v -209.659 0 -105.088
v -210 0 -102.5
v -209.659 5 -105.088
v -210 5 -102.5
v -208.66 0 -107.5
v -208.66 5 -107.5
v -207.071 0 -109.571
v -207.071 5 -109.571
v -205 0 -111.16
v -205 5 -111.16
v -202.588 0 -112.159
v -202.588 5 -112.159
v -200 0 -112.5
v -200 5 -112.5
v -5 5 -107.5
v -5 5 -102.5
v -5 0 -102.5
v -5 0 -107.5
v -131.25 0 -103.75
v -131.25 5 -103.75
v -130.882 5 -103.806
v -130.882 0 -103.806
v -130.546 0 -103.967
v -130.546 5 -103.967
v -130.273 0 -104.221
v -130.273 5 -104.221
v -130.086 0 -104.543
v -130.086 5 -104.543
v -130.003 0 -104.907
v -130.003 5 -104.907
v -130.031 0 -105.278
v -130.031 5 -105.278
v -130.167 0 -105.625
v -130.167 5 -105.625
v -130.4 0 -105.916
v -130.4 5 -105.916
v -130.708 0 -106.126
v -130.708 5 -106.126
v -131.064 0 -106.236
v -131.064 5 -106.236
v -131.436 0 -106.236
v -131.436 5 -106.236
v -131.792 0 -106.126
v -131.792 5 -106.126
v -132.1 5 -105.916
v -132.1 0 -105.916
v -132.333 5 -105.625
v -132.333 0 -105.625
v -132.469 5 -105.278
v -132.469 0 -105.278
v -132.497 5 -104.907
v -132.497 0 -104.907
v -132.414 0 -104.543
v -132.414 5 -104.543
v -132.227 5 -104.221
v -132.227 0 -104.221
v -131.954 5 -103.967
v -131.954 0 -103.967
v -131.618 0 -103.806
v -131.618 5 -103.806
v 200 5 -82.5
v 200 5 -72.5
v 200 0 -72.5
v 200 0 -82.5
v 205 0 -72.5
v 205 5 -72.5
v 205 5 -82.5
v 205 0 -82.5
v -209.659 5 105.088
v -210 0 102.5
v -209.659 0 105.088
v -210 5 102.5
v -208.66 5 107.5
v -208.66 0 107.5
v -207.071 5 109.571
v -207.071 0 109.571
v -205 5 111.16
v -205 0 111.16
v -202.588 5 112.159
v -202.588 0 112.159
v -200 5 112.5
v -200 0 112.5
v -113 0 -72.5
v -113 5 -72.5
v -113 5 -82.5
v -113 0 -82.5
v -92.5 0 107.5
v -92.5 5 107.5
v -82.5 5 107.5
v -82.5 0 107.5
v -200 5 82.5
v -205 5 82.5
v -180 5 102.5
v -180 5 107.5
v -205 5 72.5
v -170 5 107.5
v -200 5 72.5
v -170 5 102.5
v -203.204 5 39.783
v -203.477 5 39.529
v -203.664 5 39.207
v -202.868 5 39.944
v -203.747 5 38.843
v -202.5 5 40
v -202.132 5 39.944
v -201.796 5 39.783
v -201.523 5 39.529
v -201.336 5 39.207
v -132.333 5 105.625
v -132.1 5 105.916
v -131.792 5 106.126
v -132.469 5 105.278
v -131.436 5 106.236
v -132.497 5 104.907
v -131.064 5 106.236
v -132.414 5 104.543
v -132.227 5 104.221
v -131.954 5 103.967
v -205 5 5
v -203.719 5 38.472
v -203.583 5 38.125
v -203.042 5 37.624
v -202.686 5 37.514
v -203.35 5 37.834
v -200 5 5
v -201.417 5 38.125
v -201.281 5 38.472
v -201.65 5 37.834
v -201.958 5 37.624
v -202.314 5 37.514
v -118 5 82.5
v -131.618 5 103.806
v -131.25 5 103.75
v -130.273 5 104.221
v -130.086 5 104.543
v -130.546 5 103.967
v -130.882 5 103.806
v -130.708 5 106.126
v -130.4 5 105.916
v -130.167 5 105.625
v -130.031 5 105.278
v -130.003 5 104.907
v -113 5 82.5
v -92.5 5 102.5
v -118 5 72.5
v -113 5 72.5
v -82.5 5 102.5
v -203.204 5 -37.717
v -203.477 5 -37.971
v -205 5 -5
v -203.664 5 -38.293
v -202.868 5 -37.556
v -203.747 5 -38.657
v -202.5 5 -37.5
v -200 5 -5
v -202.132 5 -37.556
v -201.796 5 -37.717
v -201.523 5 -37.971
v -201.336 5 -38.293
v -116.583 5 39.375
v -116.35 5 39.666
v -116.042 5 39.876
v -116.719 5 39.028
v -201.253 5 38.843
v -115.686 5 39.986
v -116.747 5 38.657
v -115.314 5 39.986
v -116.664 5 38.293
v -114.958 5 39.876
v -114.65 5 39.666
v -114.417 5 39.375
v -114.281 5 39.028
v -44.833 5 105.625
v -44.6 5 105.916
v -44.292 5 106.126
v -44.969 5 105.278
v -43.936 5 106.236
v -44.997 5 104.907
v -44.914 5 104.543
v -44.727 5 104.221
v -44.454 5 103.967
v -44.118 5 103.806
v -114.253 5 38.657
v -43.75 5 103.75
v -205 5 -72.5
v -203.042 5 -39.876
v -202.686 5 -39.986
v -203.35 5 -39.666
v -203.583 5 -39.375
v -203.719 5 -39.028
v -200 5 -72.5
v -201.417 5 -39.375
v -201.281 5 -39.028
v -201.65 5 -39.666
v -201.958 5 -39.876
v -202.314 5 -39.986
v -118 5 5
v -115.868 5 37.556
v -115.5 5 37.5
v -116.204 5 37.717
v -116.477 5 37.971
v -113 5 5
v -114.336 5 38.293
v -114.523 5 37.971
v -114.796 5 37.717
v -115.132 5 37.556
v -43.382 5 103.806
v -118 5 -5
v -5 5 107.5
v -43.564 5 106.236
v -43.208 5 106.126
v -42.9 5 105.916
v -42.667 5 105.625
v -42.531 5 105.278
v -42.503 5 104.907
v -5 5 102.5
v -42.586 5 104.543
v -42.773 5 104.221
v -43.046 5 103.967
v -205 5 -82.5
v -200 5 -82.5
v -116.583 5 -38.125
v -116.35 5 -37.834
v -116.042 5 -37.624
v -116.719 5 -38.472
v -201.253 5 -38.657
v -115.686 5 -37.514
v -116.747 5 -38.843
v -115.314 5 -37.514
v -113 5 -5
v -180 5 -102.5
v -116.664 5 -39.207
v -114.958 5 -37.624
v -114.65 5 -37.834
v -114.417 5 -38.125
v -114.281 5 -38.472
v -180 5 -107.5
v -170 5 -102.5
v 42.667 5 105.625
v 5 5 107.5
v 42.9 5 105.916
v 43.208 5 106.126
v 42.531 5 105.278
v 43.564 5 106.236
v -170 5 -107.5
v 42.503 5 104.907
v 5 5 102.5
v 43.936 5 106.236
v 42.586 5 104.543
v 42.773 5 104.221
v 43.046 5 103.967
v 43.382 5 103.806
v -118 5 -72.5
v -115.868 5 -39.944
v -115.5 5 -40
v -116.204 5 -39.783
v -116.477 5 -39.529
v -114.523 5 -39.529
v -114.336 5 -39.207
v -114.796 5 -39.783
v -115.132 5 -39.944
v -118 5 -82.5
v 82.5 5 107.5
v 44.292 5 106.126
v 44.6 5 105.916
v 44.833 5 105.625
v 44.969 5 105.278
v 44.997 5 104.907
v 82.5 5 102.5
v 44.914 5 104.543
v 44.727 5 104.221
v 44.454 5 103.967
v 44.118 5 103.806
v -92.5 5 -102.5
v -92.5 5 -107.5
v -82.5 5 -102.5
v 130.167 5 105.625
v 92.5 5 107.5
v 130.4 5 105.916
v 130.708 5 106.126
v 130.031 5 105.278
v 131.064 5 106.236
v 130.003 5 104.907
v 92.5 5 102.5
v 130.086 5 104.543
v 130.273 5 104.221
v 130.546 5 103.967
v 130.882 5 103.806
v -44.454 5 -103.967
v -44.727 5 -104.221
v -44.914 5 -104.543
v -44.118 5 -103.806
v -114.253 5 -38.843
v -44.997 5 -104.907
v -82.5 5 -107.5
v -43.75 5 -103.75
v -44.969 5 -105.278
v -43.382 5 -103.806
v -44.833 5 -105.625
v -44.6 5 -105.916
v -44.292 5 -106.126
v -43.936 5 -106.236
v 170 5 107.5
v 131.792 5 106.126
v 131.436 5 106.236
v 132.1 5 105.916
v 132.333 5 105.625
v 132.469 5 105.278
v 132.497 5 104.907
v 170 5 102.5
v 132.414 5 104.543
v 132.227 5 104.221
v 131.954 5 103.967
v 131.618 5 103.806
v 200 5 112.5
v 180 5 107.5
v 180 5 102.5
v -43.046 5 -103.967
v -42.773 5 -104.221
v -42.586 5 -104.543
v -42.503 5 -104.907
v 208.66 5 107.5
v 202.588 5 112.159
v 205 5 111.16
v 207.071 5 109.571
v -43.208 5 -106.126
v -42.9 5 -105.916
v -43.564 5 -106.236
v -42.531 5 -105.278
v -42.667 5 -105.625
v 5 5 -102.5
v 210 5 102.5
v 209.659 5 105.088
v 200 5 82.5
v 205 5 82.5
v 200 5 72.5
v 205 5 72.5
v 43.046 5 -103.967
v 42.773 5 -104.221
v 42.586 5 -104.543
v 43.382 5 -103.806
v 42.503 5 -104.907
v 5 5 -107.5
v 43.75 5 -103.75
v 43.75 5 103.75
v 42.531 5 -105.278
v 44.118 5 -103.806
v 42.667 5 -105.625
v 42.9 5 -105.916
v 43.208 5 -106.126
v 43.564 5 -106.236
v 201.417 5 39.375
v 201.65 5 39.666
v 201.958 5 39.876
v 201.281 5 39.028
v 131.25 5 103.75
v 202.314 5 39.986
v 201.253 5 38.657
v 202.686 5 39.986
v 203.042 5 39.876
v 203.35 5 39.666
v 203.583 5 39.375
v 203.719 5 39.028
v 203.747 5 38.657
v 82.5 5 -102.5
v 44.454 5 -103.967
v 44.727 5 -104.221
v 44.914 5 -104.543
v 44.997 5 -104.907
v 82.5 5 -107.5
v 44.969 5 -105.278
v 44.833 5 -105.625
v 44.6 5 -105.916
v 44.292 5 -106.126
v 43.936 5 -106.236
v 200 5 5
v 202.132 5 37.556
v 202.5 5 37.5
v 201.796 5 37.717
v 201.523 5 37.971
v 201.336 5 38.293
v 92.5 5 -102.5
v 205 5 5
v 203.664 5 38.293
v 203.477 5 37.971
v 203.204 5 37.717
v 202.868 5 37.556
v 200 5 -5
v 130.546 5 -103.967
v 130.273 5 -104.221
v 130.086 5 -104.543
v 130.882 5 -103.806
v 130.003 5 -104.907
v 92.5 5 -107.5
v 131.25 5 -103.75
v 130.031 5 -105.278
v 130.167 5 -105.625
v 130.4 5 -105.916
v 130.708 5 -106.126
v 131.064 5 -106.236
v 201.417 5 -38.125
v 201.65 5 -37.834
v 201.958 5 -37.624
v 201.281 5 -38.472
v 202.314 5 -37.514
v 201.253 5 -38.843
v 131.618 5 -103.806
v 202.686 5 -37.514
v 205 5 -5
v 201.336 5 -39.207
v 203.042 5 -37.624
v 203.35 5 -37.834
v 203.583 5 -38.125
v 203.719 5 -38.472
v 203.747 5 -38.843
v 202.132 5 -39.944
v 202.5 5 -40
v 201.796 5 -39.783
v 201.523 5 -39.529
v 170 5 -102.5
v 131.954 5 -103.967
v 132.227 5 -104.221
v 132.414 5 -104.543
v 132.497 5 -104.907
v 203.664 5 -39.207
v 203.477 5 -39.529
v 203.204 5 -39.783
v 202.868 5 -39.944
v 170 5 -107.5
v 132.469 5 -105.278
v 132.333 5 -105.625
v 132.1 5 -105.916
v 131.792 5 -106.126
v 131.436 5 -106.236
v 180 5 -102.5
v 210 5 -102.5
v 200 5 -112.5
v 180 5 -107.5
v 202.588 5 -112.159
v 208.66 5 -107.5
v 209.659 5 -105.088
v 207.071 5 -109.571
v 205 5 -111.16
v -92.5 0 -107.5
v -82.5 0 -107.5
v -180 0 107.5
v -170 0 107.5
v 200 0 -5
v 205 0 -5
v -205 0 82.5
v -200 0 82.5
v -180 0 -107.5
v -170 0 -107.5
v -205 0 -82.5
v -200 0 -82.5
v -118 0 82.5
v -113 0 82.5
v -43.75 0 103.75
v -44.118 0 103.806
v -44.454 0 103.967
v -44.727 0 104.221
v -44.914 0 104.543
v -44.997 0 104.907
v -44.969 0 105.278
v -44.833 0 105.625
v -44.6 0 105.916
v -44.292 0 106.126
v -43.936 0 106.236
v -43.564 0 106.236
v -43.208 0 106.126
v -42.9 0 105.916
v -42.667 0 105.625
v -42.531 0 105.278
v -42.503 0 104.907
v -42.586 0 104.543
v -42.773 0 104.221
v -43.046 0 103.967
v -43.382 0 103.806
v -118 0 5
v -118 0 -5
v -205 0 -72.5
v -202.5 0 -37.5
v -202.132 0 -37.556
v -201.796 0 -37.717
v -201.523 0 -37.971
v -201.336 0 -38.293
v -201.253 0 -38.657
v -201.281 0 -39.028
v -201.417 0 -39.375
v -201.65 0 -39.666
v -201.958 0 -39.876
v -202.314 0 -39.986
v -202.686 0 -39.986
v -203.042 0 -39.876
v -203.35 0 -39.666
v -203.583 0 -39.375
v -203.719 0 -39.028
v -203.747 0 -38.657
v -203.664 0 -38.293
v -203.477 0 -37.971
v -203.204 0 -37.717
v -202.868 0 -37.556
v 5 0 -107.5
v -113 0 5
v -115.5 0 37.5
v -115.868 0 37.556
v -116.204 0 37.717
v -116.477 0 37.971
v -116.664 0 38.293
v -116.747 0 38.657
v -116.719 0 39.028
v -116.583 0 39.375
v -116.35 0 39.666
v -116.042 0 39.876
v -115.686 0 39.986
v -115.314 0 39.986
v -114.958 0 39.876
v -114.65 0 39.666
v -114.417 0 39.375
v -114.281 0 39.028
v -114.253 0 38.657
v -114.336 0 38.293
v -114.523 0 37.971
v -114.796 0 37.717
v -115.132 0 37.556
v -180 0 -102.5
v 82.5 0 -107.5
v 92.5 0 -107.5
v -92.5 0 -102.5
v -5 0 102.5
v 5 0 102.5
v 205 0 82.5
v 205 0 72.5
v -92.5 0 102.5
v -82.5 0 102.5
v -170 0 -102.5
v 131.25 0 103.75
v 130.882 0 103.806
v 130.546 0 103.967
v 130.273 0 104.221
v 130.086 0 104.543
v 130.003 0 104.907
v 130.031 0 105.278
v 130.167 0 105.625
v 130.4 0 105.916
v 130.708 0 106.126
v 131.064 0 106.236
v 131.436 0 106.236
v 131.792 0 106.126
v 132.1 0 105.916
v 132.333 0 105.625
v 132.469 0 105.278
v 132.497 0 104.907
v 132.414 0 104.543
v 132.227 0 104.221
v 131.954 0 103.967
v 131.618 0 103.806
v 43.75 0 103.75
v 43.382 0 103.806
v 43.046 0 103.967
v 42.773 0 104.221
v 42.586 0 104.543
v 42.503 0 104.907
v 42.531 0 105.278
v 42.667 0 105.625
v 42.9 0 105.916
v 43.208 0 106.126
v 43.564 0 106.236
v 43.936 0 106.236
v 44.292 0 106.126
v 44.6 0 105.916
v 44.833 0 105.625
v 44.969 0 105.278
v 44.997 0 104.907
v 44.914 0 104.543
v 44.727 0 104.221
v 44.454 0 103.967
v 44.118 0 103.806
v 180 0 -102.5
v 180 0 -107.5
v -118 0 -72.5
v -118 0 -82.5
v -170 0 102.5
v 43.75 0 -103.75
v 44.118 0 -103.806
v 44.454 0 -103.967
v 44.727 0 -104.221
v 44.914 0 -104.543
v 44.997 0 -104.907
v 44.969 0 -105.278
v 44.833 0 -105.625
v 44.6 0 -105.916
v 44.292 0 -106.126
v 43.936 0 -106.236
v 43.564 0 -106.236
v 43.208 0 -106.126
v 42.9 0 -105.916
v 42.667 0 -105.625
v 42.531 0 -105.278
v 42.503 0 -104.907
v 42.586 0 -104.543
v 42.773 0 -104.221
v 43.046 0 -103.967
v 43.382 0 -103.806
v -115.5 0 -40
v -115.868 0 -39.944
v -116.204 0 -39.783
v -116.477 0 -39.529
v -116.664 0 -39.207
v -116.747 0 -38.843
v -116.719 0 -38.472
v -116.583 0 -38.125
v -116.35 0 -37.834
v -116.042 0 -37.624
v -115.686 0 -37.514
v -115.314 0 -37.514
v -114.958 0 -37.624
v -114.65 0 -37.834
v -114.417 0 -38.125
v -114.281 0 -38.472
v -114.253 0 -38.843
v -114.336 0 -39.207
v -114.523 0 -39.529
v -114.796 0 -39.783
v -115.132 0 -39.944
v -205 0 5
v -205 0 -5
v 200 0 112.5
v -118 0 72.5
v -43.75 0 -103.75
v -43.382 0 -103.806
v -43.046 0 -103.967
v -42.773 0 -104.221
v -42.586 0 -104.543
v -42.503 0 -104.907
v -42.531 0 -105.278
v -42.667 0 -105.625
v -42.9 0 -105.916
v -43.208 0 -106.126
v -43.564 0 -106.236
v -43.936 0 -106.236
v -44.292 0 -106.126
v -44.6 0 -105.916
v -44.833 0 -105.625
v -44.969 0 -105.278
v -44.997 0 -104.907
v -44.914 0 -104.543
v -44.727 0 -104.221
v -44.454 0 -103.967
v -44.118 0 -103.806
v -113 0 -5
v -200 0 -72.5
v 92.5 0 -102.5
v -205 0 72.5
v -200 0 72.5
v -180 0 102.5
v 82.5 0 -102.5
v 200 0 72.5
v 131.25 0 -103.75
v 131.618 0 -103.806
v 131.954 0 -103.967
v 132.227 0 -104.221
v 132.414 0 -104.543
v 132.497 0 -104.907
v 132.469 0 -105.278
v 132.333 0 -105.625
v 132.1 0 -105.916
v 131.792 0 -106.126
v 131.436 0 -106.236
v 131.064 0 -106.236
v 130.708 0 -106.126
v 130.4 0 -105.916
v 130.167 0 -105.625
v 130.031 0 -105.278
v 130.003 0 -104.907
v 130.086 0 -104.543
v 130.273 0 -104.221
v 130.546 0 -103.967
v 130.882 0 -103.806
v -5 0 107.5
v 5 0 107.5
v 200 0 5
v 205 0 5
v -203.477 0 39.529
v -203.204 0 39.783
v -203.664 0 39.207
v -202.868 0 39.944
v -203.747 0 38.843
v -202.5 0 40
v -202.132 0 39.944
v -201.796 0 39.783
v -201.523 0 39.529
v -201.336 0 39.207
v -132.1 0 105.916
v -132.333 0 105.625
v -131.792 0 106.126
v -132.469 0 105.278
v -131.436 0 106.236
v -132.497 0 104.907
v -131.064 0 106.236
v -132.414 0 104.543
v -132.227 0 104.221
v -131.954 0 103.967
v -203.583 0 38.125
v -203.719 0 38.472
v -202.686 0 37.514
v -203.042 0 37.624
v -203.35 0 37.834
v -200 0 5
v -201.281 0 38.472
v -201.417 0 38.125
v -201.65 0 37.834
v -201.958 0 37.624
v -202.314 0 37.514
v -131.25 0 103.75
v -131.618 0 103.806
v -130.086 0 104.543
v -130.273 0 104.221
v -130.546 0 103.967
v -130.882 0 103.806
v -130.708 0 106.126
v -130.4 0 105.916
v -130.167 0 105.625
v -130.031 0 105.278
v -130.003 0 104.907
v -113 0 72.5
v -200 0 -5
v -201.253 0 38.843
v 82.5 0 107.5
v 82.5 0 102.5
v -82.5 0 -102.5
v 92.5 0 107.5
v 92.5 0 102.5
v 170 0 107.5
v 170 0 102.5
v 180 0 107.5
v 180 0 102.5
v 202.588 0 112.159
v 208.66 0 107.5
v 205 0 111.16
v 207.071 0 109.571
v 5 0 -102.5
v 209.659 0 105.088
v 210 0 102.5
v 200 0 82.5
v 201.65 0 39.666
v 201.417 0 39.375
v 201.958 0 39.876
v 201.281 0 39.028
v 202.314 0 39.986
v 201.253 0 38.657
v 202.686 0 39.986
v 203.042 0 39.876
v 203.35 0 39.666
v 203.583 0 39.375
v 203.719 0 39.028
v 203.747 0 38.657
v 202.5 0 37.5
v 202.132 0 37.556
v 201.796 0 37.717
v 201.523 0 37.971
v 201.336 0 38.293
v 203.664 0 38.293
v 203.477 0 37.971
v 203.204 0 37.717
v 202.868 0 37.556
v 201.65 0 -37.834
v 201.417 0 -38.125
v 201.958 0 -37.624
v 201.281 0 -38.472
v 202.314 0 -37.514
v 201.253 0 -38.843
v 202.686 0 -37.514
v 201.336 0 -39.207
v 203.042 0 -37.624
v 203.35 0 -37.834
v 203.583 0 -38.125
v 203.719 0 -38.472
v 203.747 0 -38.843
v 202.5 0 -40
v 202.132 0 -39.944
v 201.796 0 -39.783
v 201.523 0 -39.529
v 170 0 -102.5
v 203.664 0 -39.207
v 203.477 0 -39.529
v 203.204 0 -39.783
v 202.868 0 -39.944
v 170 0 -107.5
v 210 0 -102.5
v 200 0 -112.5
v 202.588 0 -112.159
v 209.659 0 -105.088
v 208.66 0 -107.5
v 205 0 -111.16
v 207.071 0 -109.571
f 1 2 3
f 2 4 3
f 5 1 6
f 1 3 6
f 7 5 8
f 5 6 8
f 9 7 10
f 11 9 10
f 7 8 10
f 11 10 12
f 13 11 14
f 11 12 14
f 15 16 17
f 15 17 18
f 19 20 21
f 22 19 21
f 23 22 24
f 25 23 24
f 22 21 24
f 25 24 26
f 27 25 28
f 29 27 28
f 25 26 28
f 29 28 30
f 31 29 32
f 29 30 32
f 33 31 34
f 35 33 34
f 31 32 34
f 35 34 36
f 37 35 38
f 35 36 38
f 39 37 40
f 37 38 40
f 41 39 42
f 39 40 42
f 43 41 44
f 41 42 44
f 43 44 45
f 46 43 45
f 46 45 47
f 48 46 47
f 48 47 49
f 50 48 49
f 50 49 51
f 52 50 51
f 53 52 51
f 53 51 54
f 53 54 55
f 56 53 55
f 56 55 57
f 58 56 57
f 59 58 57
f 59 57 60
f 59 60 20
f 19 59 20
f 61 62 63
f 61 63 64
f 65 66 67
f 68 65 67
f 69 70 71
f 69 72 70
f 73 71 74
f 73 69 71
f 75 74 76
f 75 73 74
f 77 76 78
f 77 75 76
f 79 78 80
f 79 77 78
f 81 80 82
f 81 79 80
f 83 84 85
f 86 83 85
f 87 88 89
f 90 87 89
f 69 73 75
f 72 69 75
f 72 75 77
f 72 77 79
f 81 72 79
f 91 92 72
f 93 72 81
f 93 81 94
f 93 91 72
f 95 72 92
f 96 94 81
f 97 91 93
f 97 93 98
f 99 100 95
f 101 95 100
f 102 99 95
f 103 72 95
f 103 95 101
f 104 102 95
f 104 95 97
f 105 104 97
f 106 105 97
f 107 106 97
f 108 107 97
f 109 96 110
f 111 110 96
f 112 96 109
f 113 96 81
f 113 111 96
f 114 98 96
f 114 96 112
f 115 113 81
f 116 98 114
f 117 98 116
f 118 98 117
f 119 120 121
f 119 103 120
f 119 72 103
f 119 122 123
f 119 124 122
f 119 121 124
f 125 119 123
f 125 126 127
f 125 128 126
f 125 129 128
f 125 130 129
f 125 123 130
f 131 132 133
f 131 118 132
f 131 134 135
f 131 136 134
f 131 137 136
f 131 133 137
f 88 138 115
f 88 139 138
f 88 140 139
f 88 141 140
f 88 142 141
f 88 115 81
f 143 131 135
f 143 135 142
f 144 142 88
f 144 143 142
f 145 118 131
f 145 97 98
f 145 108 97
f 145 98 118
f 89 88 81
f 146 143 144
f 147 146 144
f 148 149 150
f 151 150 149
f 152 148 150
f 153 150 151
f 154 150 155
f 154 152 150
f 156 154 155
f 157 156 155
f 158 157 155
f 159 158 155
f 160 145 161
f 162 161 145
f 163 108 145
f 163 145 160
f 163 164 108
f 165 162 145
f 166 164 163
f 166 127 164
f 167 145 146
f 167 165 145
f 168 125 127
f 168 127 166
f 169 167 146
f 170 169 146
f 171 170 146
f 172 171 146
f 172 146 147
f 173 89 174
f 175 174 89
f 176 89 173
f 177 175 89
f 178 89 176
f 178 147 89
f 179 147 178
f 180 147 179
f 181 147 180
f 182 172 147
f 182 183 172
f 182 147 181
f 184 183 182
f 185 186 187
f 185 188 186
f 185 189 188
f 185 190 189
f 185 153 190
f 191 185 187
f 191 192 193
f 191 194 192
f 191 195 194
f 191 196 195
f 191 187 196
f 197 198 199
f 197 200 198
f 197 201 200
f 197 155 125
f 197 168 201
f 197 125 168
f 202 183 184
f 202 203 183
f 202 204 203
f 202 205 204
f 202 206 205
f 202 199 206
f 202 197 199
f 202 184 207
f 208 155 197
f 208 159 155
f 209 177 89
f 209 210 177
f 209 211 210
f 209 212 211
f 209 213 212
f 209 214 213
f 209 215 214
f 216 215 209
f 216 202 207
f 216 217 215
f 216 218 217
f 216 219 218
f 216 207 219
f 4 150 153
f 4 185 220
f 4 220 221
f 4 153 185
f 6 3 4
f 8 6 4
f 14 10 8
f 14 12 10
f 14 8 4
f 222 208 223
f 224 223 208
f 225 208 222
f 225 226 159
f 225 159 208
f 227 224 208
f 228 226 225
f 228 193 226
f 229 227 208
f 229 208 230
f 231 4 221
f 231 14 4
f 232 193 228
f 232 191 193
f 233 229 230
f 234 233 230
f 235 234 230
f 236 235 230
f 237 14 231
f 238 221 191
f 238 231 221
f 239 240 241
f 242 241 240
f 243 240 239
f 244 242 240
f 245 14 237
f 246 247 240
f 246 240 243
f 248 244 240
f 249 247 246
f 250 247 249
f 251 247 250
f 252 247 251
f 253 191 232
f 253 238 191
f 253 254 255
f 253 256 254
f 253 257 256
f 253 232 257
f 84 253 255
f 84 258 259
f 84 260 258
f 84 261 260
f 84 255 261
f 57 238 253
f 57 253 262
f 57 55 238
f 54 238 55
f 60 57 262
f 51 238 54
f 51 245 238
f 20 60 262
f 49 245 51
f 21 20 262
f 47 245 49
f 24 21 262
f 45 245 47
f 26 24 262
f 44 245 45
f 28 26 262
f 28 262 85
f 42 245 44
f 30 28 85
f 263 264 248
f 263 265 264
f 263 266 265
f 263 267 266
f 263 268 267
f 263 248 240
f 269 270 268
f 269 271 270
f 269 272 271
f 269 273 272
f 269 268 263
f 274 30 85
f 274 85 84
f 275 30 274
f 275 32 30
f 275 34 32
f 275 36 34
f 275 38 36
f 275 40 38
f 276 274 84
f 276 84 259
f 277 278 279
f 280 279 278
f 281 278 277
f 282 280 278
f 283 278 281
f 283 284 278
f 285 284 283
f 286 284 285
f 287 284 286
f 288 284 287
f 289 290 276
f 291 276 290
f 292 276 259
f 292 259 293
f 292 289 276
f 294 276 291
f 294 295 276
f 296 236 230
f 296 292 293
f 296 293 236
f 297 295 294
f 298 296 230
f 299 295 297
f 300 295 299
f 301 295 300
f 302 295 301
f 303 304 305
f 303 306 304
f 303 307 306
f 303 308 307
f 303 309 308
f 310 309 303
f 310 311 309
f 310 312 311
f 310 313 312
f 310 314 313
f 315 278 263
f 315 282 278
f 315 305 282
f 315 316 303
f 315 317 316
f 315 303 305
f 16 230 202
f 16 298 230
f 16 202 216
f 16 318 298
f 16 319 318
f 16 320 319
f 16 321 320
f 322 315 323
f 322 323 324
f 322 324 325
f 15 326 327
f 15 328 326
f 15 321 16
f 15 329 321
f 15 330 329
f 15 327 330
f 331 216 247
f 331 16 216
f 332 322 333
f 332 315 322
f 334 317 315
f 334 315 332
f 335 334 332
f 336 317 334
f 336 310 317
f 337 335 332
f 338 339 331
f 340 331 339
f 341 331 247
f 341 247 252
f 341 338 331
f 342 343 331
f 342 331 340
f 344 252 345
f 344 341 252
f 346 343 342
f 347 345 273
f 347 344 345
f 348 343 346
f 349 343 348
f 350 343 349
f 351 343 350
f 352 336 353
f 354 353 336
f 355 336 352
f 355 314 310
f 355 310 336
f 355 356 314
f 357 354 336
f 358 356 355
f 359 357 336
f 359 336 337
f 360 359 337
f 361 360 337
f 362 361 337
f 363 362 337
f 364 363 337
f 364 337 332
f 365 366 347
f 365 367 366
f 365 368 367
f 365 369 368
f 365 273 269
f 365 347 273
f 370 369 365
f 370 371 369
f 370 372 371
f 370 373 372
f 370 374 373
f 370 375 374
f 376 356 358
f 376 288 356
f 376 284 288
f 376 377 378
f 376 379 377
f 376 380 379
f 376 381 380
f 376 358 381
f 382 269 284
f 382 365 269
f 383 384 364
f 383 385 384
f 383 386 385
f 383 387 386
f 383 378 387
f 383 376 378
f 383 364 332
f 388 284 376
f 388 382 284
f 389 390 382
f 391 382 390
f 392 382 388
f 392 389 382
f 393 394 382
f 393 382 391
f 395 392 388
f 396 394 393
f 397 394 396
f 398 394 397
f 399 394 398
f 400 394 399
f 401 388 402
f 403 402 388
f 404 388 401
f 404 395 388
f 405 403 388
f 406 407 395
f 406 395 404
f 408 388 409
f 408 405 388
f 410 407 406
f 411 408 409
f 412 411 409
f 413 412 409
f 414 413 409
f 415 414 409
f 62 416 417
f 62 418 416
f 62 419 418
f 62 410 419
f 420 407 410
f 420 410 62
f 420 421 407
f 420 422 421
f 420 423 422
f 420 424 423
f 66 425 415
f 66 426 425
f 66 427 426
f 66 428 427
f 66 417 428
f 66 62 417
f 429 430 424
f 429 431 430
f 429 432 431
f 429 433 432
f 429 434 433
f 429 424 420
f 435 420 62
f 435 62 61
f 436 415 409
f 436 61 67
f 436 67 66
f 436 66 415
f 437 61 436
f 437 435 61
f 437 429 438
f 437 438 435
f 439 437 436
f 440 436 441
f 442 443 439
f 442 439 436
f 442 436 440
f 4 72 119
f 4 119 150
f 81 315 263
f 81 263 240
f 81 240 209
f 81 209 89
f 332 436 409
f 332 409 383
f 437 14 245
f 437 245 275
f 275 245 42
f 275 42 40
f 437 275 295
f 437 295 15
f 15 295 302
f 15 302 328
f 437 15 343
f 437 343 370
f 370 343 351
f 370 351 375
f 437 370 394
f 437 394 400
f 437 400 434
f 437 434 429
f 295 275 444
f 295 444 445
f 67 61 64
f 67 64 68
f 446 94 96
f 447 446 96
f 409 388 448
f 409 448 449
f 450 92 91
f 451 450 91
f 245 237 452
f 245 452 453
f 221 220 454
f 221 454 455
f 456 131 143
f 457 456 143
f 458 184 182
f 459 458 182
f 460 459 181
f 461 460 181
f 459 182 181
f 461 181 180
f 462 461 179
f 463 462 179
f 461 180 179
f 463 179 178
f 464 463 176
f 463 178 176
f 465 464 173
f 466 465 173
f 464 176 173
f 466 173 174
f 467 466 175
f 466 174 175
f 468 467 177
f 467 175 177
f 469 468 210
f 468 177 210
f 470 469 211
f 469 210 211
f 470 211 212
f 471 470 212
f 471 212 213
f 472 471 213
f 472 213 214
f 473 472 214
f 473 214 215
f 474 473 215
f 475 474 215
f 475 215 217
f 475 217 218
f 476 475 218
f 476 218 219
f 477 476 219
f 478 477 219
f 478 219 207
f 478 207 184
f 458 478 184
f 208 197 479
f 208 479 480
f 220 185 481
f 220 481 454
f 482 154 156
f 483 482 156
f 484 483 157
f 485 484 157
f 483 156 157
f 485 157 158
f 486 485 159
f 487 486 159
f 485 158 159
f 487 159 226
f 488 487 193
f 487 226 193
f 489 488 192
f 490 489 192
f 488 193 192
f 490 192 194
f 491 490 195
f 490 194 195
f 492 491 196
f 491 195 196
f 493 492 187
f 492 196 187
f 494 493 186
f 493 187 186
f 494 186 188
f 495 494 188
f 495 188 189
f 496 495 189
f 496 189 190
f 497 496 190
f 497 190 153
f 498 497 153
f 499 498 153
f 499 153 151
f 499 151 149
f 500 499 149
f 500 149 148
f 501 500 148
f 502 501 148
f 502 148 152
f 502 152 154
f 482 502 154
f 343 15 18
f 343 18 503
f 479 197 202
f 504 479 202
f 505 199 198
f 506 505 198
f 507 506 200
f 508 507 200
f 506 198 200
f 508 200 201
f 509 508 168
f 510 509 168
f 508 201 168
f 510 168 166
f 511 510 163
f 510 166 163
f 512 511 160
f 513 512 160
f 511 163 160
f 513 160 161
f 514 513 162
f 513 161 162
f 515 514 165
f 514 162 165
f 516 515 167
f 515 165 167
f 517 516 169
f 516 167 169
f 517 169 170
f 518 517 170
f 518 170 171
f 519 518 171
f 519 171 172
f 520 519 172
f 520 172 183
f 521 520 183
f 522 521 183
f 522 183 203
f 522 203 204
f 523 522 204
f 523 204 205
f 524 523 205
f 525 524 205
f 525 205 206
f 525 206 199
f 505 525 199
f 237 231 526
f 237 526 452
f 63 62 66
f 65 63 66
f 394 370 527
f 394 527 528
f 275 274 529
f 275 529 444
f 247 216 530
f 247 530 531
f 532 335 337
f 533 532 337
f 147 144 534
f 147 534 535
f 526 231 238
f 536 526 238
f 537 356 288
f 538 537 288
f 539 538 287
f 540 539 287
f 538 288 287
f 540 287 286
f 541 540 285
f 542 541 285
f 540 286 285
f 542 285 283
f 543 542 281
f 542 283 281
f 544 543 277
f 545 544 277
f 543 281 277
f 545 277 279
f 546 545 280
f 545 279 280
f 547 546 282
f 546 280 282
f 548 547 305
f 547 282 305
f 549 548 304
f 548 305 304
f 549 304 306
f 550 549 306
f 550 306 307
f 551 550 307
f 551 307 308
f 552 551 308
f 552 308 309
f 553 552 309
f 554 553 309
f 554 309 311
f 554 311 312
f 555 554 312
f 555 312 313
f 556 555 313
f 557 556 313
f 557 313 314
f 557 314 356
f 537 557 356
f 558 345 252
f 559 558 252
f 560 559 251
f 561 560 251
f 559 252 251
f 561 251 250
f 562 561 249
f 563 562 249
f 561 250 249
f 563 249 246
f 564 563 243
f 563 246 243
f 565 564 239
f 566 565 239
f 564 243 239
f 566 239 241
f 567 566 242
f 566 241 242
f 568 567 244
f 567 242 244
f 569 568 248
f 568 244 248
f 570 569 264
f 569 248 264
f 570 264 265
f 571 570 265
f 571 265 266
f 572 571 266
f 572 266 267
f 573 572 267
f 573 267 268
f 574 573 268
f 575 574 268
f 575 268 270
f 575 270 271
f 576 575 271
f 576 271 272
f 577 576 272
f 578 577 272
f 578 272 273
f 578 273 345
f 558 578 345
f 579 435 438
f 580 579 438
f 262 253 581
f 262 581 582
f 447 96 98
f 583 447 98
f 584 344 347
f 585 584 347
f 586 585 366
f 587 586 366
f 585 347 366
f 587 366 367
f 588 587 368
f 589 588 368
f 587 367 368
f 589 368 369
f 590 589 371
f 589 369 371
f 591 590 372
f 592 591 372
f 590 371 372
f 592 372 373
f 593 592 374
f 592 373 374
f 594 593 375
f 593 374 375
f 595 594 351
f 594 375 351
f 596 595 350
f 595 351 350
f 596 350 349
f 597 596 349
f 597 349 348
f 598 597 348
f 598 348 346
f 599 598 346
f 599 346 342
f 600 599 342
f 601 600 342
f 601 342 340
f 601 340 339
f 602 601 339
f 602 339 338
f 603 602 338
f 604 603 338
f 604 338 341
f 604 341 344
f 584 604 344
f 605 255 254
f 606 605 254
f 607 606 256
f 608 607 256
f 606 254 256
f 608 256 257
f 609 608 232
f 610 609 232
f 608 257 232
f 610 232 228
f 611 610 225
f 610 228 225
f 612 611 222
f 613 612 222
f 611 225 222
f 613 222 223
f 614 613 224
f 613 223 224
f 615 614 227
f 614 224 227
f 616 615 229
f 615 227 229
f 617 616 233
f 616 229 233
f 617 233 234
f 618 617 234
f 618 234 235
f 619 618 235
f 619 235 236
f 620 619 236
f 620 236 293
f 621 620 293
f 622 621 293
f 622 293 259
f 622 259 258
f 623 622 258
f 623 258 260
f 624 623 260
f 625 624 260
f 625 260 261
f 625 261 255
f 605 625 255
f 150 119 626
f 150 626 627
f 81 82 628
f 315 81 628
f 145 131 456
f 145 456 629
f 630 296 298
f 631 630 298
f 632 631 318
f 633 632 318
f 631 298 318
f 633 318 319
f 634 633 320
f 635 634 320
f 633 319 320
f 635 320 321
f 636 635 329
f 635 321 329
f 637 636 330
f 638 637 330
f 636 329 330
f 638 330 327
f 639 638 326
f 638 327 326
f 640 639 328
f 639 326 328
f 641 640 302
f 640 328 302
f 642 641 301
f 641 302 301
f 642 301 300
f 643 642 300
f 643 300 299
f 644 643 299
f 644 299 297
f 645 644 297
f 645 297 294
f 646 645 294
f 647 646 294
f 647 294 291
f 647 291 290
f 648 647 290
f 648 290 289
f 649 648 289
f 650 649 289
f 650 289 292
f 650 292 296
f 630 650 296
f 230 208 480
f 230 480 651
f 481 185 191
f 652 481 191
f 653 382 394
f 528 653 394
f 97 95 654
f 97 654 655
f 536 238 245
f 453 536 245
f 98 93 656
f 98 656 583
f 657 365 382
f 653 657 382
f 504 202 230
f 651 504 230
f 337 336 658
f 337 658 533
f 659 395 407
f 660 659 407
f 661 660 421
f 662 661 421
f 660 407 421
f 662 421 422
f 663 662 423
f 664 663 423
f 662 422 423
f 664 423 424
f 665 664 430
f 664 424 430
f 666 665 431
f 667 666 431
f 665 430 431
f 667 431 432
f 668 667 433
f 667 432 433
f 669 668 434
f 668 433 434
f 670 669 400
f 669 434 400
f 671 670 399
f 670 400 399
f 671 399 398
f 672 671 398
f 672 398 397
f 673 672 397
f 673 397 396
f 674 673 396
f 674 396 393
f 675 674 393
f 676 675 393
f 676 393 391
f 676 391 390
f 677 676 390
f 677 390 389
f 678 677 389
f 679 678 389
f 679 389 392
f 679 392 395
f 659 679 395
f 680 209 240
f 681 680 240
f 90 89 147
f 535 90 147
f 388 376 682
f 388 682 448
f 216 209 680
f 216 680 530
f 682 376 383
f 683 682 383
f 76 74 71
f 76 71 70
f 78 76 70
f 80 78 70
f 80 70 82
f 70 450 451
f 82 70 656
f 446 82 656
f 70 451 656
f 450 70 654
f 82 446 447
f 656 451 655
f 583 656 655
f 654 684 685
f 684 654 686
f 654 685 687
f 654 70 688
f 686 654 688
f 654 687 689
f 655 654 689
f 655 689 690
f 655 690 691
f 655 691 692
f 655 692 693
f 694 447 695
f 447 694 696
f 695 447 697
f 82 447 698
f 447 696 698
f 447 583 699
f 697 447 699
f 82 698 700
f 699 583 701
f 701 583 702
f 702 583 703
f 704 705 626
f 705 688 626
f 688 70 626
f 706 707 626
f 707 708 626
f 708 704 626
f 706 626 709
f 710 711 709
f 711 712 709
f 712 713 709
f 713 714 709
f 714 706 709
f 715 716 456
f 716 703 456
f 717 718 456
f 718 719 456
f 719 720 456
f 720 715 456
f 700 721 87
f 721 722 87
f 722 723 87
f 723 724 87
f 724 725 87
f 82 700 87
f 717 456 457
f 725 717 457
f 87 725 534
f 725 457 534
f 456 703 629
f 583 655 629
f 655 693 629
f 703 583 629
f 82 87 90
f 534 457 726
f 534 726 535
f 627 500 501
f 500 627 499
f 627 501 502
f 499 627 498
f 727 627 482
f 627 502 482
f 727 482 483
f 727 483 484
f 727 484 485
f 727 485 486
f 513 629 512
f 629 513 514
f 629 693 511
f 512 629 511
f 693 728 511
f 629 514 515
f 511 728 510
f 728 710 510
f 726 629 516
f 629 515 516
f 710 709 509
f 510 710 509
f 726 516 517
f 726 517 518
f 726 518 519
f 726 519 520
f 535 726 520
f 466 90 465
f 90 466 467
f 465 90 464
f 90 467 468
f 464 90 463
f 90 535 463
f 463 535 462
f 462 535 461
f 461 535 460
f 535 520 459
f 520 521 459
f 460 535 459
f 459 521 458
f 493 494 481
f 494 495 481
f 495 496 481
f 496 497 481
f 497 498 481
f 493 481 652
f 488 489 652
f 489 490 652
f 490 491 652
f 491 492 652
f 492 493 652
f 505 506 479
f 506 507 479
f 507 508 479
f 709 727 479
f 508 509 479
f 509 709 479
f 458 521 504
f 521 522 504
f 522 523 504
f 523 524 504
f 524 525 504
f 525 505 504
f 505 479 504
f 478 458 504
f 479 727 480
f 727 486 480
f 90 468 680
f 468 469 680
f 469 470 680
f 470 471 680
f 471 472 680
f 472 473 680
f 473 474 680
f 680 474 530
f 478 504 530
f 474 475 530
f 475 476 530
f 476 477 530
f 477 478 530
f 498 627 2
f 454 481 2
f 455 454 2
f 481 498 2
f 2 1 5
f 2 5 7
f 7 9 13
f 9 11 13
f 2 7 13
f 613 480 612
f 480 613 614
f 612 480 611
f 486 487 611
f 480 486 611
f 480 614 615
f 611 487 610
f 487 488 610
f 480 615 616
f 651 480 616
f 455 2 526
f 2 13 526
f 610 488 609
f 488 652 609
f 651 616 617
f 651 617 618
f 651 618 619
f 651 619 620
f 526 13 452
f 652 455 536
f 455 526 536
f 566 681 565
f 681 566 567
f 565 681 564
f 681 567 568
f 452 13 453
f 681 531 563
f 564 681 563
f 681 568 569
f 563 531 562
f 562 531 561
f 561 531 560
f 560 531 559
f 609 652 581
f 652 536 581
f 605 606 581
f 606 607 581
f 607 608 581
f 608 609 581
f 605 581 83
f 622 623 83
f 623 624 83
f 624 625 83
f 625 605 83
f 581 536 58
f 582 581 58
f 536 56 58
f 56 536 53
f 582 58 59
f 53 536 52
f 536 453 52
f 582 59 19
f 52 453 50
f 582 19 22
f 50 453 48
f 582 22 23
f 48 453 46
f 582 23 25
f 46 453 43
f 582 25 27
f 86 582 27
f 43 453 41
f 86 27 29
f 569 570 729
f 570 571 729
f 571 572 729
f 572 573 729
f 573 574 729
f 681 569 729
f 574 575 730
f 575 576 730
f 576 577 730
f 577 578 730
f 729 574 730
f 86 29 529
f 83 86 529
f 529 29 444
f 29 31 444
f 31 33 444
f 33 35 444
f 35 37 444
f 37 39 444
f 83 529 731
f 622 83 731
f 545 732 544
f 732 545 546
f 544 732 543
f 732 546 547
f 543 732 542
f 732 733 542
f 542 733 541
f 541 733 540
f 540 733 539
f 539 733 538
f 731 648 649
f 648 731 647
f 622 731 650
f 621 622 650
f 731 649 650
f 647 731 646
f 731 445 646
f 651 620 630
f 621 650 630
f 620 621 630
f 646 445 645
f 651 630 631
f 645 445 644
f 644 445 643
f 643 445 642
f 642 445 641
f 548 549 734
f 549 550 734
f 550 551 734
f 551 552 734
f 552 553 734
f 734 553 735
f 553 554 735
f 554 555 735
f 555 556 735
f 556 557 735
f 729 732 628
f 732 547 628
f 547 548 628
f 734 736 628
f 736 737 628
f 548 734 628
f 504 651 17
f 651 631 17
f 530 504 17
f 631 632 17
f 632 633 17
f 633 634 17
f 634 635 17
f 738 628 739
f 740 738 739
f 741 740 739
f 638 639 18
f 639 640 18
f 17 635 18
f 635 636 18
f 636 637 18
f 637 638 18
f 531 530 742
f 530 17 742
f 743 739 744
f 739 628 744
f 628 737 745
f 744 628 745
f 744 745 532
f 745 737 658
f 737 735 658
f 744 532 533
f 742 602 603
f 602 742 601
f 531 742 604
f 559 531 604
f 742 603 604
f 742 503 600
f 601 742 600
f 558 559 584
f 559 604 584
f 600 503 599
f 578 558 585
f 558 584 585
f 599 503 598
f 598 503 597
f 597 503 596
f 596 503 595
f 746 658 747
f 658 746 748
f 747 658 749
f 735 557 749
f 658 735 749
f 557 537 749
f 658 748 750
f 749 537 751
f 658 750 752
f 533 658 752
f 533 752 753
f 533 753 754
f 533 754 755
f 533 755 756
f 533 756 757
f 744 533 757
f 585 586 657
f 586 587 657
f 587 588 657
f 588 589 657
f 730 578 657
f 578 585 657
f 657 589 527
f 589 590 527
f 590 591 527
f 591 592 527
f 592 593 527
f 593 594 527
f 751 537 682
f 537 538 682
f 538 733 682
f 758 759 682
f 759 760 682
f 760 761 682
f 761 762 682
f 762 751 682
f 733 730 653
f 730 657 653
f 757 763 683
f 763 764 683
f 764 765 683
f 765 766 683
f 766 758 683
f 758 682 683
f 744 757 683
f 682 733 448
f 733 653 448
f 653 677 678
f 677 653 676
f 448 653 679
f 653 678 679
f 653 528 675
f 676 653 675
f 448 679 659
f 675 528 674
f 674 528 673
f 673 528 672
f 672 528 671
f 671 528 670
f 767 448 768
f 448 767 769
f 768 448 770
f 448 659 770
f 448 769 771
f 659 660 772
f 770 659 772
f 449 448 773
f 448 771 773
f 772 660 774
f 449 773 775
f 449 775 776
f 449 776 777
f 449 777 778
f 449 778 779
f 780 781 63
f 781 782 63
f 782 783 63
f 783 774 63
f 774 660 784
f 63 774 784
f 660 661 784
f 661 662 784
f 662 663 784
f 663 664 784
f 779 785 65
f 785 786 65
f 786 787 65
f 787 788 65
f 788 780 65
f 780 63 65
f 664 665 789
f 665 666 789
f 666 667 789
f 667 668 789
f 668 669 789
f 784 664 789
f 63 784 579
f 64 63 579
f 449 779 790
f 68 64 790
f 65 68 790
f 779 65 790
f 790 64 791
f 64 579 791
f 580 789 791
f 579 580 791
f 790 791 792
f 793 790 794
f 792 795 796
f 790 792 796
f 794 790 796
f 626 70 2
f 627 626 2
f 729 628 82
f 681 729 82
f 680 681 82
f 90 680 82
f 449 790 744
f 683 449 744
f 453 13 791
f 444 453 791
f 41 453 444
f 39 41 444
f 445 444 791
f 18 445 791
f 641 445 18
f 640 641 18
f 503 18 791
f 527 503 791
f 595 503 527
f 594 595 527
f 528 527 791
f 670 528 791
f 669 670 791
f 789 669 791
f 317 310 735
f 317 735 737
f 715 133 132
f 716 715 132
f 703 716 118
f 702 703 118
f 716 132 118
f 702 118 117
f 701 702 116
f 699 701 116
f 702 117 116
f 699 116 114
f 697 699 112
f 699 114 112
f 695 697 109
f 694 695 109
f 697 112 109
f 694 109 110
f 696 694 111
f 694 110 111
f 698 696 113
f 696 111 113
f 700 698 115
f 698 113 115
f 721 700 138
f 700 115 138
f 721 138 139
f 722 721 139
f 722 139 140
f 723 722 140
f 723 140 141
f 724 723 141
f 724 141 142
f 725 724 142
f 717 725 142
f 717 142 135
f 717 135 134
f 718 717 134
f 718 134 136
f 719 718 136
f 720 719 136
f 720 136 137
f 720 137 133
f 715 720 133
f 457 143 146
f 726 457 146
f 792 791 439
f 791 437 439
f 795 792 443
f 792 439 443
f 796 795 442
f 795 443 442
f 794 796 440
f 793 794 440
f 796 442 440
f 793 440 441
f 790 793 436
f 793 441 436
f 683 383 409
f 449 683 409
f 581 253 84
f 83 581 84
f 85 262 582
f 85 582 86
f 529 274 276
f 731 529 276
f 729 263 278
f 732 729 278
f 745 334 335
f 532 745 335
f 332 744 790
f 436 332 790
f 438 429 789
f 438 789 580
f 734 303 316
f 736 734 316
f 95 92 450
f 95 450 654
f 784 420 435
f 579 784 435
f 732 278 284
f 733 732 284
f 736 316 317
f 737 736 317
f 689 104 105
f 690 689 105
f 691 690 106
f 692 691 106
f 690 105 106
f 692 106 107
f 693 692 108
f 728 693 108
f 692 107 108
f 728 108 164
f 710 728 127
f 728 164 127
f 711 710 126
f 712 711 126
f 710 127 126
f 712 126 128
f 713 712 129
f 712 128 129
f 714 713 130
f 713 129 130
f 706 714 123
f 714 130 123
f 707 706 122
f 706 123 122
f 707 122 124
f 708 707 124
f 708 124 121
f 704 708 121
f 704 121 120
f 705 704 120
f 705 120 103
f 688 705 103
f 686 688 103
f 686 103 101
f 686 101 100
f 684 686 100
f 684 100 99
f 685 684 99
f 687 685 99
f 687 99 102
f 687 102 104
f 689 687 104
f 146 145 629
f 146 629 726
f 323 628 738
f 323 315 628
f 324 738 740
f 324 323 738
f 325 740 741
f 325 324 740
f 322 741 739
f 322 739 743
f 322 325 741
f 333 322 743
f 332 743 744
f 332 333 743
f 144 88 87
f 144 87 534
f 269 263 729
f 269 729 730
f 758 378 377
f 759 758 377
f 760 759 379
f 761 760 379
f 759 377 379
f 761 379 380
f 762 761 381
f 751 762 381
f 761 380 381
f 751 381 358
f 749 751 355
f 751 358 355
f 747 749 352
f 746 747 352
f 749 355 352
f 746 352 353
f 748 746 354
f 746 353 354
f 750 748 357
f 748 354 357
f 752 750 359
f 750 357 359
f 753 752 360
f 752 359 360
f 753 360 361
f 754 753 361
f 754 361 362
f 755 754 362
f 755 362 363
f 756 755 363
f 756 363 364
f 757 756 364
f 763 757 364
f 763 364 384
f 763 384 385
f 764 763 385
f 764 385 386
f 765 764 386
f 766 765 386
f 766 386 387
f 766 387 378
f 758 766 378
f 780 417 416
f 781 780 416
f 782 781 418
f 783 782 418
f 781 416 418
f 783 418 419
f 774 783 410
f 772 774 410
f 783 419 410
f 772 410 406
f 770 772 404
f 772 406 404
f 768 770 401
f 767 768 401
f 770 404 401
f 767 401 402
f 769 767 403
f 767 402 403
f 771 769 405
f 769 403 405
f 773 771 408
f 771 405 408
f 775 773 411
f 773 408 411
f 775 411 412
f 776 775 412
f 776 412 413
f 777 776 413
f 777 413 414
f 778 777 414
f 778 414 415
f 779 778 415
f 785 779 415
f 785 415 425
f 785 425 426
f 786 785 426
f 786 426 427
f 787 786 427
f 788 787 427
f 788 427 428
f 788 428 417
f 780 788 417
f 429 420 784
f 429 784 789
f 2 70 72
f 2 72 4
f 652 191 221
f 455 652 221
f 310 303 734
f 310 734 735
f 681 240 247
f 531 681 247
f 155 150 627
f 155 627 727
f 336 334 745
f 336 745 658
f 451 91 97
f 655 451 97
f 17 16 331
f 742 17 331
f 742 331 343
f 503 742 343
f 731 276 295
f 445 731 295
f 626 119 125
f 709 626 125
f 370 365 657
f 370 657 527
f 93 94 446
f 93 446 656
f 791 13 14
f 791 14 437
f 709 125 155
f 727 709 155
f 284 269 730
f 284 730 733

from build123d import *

# Parameters (mm, degrees)
SKETCH1_W           = 420
SKETCH1_H           = 225
BOSS_EXTRUDE1_DEPTH = 5
SKETCH2_W           = 5
SKETCH2_H           = 10
SKETCH2_W_2         = 10
SKETCH2_H_2         = 5
CUT_EXTRUDE1_DEPTH  = 239.288165883
FILLET1_R           = 10
SKETCH3_R           = 1.25
CUT_EXTRUDE2_DEPTH  = 239.288165883


with BuildPart() as part:
    # Sketch1 → Boss-Extrude1 (new body)
    with BuildSketch(Plane(origin=(0, 0, 0), x_dir=(1, 0, 0), z_dir=(0, 1, 0))):
        Rectangle(SKETCH1_W, SKETCH1_H)
    extrude(amount=BOSS_EXTRUDE1_DEPTH)

    # Sketch2 → Cut-Extrude1 (cut, through all)
    with BuildSketch(Plane(origin=(0, 5, 0), x_dir=(1, 0, 0), z_dir=(0, 1, 0))):
        with Locations((202.5, -77.5)):
            Rectangle(SKETCH2_W, SKETCH2_H)
        with Locations((-87.5, 105)):
            Rectangle(SKETCH2_W_2, SKETCH2_H_2)
        with Locations((-175, 105)):
            Rectangle(SKETCH2_W_2, SKETCH2_H_2)
        with Locations((-202.5, 77.5)):
            Rectangle(SKETCH2_W, SKETCH2_H)
        with Locations((0, 105)):
            Rectangle(SKETCH2_W_2, SKETCH2_H_2)
        with Locations((87.5, 105)):
            Rectangle(SKETCH2_W_2, SKETCH2_H_2)
        with Locations((175, 105)):
            Rectangle(SKETCH2_W_2, SKETCH2_H_2)
        with Locations((-202.5, 0)):
            Rectangle(SKETCH2_W, SKETCH2_H)
        with Locations((-202.5, -77.5)):
            Rectangle(SKETCH2_W, SKETCH2_H)
        with Locations((202.5, 0)):
            Rectangle(SKETCH2_W, SKETCH2_H)
        with Locations((202.5, 77.5)):
            Rectangle(SKETCH2_W, SKETCH2_H)
        with Locations((175, -105)):
            Rectangle(SKETCH2_W_2, SKETCH2_H_2)
        with Locations((87.5, -105)):
            Rectangle(SKETCH2_W_2, SKETCH2_H_2)
        with Locations((0, -105)):
            Rectangle(SKETCH2_W_2, SKETCH2_H_2)
        with Locations((-87.5, -105)):
            Rectangle(SKETCH2_W_2, SKETCH2_H_2)
        with Locations((-175, -105)):
            Rectangle(SKETCH2_W_2, SKETCH2_H_2)
        with Locations((-115.5, 77.5)):
            Rectangle(SKETCH2_W, SKETCH2_H)
        with Locations((-115.5, -77.5)):
            Rectangle(SKETCH2_W, SKETCH2_H)
        with Locations((-115.5, 0)):
            Rectangle(SKETCH2_W, SKETCH2_H)
    extrude(amount=-CUT_EXTRUDE1_DEPTH, mode=Mode.SUBTRACT)

    # Fillet1
    fillet1_edges = [part.edges().sort_by_distance(p)[0] for p in [
        (210, 2.5, 112.5),
        (-210, 2.5, 112.5),
        (-210, 2.5, -112.5),
        (210, 2.5, -112.5),
    ]]
    fillet(fillet1_edges, radius=FILLET1_R)

    # Sketch3 → Cut-Extrude2 (cut, through all)
    with BuildSketch(Plane(origin=(0, 5, 0), x_dir=(1, 0, 0), z_dir=(0, 1, 0))):
        with Locations(Location((-131.25, 105, 0), (0, 0, 270))):
            Circle(SKETCH3_R)
        with Locations(Location((-202.5, 38.75, 0), (0, 0, 270))):
            Circle(SKETCH3_R)
        with Locations(Location((-202.5, -38.75, 0), (0, 0, 270))):
            Circle(SKETCH3_R)
        with Locations(Location((-43.75, 105, 0), (0, 0, 270))):
            Circle(SKETCH3_R)
        with Locations(Location((43.75, 105, 0), (0, 0, 270))):
            Circle(SKETCH3_R)
        with Locations(Location((131.25, 105, 0), (0, 0, 270))):
            Circle(SKETCH3_R)
        with Locations(Location((-115.5, -38.75, 0), (0, 0, 90))):
            Circle(SKETCH3_R)
        with Locations(Location((-115.5, 38.75, 0), (0, 0, 90))):
            Circle(SKETCH3_R)
        with Locations(Location((202.5, -38.75, 0), (0, 0, 90))):
            Circle(SKETCH3_R)
        with Locations(Location((202.5, 38.75, 0), (0, 0, 90))):
            Circle(SKETCH3_R)
        with Locations(Location((131.25, -105, 0), (0, 0, 90))):
            Circle(SKETCH3_R)
        with Locations(Location((43.75, -105, 0), (0, 0, 90))):
            Circle(SKETCH3_R)
        with Locations(Location((-43.75, -105, 0), (0, 0, 90))):
            Circle(SKETCH3_R)
        with Locations(Location((-131.25, -105, 0), (0, 0, 90))):
            Circle(SKETCH3_R)
    extrude(amount=-CUT_EXTRUDE2_DEPTH, mode=Mode.SUBTRACT)


solid = part.part
